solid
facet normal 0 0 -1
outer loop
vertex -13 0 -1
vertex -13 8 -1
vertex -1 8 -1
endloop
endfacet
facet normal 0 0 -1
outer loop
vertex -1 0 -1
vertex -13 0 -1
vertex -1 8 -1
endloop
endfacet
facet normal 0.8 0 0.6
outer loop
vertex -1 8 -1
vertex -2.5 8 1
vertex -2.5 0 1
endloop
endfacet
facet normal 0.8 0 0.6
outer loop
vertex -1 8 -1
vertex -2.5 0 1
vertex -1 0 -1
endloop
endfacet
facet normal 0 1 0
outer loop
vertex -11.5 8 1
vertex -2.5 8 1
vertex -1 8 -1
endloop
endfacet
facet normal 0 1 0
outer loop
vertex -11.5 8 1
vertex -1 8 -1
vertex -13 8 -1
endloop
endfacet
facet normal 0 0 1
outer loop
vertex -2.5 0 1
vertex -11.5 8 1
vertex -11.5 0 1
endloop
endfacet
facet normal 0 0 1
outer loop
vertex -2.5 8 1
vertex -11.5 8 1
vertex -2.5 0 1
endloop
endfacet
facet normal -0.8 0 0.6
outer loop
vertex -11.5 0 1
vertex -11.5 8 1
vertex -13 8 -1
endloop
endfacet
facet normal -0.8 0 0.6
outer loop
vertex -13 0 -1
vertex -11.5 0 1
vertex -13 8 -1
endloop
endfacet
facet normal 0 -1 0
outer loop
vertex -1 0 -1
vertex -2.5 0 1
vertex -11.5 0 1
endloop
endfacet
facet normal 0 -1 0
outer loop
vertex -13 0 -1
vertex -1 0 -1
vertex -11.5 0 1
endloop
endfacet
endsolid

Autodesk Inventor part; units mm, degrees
ref_plane "YZ Plane" through (0, 0, 0) normal (1, 0, 0) x (0, 1, 0)
ref_plane "XZ Plane" through (0, 0, 0) normal (0, 1, 0) x (-1, 0, 0)
ref_plane "XY Plane" through (0, 0, 0) normal (0, 0, 1) x (1, 0, 0)
sketch "Sketch1" plane through (0, 0, 0) normal (0, 1, 0) x (-1, 0, 0)
  line L0 (0, 0) -> (14, 0)
  line L1 (14, 0) -> (14, -2)
  line L2 (14, -2) -> (0, -2)
  line L3 (0, -2) -> (0, 0)
  line L4 (14, -1) -> (13, -1)
  line L5 (7, -2) -> (7, -1)
  circle A0 centre (13, -1) radius 0.5
  circle A1 centre (1, -1) radius 0.5
  dimension "d0" = 14
  dimension "d1" = 2
  dimension "d2" = 1
  dimension "d3" = 1
extrude "Extrusion1" add sketch "Sketch1" along normal blind 8
sketch "Sketch2" plane through (0, 8, 0) normal (0, 1, 0) x (1, 0, 0)
  circle A0 centre (-13, 1) radius 0.5 projected
  line L0 (-13, 1) -> (-11.5, 1)
  line L1 (-11.5, 1) -> (-11.5, 2)
  line L2 (0, 2) -> (-14, 2) projected
  line L3 (-11.5, 1) -> (-11.5, 0)
  line L4 (-14, 0) -> (0, 0) projected
  line L5 (-7, 2) -> (-7, 5.1392)
  line L6 (-13, 1) -> (-11.5, 2)
  line L7 (-13, 1) -> (-11.5, 0)
  circle A1 centre (-1, 1) radius 0.5
  line L8 (-1, 1) -> (-2.5, 1)
  line L9 (-2.5, 1) -> (-2.5, 2)
  line L10 (-14, 2) -> (0, 2)
  line L11 (-2.5, 1) -> (-2.5, 0)
  line L12 (0, 0) -> (-14, 0)
  line L13 (-1, 1) -> (-2.5, 2)
  line L14 (-1, 1) -> (-2.5, 0)
  line L15 (-11.5, 0) -> (-14, 0)
  line L16 (-14, 0) -> (-14, 2)
  line L17 (-14, 2) -> (-11.5, 2)
  line L18 (-11.5, 2) -> (-11.5, 0)
  line L19 (0, 0) -> (0, 2) projected
  line L20 (0, 0) -> (-2.5, 0)
  line L21 (-2.5, 0) -> (-2.5, 2)
  line L22 (-2.5, 2) -> (0, 2)
  line L23 (0, 2) -> (0, 0)
  point P0 (-12.584, 0.7226)
  point P1 (-12.584, 1.2774)
  point P2 (-1.416, 1.2774)
  point P3 (-1.416, 0.7226)
  dimension "d6" = 1.5
extrude "Extrusion2" add sketch "Sketch2" against normal blind 8 contours L0 L6 A0 | L0 L3 L7 A0 | A0 L7 L0 | A0 L6 L1 L0 | L11 L8 A1 L14 | L13 A1 L8 L9 | A1 L8 L14 | L13 L8 A1
extrude "Extrusion3" cut sketch "Sketch2" against normal blind 8 contours A0 L7 L4 L16 L2 L6 | L14 A1 L13 L2 L19 L4
sketch "Sketch3" plane through (0, 8, 0) normal (0, 1, 0) x (1, 0, 0)
  line L0 (-11.5, 2) -> (-13, 1) projected
  line L1 (-1, 1) -> (-2.5, 2) projected
  line L2 (-13, 1) -> (-1, 1)
  line L3 (-13, 1) -> (-11.5, 0) projected
  line L4 (-13, 1) -> (-0.4084, 1)
  line L5 (-0.4084, 1) -> (-0.4084, 3.5124)
  line L6 (-0.4084, 3.5124) -> (-13, 3.5124)
  line L7 (-13, 3.5124) -> (-13, 1)
  point P0 (0, 0)
extrude "Extrusion4" cut sketch "Sketch3" against normal blind 8
sketch "Sketch4" plane through (0, 8, 0) normal (0, 1, 0) x (1, 0, 0)
  line L0 (-11.5, 0) -> (-11.5, -1)
  line L1 (-11.5, 0) -> (-13, 1) projected
  line L2 (-11.5, -1) -> (-13, 1)
  line L3 (-11.5, 0) -> (-2.5, 0) projected
  line L4 (-13, 1) -> (-11.5, 0)
  line L5 (-1, 1) -> (-13, 1) projected
  line L6 (-7, 1) -> (-7, 2.0592)
  line L7 (-2.5, 0) -> (-2.5, -1)
  line L8 (-2.5, 0) -> (-1, 1)
  line L9 (-2.5, -1) -> (-1, 1)
  line L10 (-1, 1) -> (-2.5, 0)
  line L11 (-11.5, -1) -> (-2.5, -1)
  line L12 (-11.5, 0) -> (-2.5, 0)
  point P0 (0, 0)
  dimension "d13" = 1
extrude "Extrusion5" add sketch "Sketch4" against normal blind 8 contours L3 L7 L11 L0 | L0 L2 L1 | L8 L9 L7
properties part number "link_v2"
